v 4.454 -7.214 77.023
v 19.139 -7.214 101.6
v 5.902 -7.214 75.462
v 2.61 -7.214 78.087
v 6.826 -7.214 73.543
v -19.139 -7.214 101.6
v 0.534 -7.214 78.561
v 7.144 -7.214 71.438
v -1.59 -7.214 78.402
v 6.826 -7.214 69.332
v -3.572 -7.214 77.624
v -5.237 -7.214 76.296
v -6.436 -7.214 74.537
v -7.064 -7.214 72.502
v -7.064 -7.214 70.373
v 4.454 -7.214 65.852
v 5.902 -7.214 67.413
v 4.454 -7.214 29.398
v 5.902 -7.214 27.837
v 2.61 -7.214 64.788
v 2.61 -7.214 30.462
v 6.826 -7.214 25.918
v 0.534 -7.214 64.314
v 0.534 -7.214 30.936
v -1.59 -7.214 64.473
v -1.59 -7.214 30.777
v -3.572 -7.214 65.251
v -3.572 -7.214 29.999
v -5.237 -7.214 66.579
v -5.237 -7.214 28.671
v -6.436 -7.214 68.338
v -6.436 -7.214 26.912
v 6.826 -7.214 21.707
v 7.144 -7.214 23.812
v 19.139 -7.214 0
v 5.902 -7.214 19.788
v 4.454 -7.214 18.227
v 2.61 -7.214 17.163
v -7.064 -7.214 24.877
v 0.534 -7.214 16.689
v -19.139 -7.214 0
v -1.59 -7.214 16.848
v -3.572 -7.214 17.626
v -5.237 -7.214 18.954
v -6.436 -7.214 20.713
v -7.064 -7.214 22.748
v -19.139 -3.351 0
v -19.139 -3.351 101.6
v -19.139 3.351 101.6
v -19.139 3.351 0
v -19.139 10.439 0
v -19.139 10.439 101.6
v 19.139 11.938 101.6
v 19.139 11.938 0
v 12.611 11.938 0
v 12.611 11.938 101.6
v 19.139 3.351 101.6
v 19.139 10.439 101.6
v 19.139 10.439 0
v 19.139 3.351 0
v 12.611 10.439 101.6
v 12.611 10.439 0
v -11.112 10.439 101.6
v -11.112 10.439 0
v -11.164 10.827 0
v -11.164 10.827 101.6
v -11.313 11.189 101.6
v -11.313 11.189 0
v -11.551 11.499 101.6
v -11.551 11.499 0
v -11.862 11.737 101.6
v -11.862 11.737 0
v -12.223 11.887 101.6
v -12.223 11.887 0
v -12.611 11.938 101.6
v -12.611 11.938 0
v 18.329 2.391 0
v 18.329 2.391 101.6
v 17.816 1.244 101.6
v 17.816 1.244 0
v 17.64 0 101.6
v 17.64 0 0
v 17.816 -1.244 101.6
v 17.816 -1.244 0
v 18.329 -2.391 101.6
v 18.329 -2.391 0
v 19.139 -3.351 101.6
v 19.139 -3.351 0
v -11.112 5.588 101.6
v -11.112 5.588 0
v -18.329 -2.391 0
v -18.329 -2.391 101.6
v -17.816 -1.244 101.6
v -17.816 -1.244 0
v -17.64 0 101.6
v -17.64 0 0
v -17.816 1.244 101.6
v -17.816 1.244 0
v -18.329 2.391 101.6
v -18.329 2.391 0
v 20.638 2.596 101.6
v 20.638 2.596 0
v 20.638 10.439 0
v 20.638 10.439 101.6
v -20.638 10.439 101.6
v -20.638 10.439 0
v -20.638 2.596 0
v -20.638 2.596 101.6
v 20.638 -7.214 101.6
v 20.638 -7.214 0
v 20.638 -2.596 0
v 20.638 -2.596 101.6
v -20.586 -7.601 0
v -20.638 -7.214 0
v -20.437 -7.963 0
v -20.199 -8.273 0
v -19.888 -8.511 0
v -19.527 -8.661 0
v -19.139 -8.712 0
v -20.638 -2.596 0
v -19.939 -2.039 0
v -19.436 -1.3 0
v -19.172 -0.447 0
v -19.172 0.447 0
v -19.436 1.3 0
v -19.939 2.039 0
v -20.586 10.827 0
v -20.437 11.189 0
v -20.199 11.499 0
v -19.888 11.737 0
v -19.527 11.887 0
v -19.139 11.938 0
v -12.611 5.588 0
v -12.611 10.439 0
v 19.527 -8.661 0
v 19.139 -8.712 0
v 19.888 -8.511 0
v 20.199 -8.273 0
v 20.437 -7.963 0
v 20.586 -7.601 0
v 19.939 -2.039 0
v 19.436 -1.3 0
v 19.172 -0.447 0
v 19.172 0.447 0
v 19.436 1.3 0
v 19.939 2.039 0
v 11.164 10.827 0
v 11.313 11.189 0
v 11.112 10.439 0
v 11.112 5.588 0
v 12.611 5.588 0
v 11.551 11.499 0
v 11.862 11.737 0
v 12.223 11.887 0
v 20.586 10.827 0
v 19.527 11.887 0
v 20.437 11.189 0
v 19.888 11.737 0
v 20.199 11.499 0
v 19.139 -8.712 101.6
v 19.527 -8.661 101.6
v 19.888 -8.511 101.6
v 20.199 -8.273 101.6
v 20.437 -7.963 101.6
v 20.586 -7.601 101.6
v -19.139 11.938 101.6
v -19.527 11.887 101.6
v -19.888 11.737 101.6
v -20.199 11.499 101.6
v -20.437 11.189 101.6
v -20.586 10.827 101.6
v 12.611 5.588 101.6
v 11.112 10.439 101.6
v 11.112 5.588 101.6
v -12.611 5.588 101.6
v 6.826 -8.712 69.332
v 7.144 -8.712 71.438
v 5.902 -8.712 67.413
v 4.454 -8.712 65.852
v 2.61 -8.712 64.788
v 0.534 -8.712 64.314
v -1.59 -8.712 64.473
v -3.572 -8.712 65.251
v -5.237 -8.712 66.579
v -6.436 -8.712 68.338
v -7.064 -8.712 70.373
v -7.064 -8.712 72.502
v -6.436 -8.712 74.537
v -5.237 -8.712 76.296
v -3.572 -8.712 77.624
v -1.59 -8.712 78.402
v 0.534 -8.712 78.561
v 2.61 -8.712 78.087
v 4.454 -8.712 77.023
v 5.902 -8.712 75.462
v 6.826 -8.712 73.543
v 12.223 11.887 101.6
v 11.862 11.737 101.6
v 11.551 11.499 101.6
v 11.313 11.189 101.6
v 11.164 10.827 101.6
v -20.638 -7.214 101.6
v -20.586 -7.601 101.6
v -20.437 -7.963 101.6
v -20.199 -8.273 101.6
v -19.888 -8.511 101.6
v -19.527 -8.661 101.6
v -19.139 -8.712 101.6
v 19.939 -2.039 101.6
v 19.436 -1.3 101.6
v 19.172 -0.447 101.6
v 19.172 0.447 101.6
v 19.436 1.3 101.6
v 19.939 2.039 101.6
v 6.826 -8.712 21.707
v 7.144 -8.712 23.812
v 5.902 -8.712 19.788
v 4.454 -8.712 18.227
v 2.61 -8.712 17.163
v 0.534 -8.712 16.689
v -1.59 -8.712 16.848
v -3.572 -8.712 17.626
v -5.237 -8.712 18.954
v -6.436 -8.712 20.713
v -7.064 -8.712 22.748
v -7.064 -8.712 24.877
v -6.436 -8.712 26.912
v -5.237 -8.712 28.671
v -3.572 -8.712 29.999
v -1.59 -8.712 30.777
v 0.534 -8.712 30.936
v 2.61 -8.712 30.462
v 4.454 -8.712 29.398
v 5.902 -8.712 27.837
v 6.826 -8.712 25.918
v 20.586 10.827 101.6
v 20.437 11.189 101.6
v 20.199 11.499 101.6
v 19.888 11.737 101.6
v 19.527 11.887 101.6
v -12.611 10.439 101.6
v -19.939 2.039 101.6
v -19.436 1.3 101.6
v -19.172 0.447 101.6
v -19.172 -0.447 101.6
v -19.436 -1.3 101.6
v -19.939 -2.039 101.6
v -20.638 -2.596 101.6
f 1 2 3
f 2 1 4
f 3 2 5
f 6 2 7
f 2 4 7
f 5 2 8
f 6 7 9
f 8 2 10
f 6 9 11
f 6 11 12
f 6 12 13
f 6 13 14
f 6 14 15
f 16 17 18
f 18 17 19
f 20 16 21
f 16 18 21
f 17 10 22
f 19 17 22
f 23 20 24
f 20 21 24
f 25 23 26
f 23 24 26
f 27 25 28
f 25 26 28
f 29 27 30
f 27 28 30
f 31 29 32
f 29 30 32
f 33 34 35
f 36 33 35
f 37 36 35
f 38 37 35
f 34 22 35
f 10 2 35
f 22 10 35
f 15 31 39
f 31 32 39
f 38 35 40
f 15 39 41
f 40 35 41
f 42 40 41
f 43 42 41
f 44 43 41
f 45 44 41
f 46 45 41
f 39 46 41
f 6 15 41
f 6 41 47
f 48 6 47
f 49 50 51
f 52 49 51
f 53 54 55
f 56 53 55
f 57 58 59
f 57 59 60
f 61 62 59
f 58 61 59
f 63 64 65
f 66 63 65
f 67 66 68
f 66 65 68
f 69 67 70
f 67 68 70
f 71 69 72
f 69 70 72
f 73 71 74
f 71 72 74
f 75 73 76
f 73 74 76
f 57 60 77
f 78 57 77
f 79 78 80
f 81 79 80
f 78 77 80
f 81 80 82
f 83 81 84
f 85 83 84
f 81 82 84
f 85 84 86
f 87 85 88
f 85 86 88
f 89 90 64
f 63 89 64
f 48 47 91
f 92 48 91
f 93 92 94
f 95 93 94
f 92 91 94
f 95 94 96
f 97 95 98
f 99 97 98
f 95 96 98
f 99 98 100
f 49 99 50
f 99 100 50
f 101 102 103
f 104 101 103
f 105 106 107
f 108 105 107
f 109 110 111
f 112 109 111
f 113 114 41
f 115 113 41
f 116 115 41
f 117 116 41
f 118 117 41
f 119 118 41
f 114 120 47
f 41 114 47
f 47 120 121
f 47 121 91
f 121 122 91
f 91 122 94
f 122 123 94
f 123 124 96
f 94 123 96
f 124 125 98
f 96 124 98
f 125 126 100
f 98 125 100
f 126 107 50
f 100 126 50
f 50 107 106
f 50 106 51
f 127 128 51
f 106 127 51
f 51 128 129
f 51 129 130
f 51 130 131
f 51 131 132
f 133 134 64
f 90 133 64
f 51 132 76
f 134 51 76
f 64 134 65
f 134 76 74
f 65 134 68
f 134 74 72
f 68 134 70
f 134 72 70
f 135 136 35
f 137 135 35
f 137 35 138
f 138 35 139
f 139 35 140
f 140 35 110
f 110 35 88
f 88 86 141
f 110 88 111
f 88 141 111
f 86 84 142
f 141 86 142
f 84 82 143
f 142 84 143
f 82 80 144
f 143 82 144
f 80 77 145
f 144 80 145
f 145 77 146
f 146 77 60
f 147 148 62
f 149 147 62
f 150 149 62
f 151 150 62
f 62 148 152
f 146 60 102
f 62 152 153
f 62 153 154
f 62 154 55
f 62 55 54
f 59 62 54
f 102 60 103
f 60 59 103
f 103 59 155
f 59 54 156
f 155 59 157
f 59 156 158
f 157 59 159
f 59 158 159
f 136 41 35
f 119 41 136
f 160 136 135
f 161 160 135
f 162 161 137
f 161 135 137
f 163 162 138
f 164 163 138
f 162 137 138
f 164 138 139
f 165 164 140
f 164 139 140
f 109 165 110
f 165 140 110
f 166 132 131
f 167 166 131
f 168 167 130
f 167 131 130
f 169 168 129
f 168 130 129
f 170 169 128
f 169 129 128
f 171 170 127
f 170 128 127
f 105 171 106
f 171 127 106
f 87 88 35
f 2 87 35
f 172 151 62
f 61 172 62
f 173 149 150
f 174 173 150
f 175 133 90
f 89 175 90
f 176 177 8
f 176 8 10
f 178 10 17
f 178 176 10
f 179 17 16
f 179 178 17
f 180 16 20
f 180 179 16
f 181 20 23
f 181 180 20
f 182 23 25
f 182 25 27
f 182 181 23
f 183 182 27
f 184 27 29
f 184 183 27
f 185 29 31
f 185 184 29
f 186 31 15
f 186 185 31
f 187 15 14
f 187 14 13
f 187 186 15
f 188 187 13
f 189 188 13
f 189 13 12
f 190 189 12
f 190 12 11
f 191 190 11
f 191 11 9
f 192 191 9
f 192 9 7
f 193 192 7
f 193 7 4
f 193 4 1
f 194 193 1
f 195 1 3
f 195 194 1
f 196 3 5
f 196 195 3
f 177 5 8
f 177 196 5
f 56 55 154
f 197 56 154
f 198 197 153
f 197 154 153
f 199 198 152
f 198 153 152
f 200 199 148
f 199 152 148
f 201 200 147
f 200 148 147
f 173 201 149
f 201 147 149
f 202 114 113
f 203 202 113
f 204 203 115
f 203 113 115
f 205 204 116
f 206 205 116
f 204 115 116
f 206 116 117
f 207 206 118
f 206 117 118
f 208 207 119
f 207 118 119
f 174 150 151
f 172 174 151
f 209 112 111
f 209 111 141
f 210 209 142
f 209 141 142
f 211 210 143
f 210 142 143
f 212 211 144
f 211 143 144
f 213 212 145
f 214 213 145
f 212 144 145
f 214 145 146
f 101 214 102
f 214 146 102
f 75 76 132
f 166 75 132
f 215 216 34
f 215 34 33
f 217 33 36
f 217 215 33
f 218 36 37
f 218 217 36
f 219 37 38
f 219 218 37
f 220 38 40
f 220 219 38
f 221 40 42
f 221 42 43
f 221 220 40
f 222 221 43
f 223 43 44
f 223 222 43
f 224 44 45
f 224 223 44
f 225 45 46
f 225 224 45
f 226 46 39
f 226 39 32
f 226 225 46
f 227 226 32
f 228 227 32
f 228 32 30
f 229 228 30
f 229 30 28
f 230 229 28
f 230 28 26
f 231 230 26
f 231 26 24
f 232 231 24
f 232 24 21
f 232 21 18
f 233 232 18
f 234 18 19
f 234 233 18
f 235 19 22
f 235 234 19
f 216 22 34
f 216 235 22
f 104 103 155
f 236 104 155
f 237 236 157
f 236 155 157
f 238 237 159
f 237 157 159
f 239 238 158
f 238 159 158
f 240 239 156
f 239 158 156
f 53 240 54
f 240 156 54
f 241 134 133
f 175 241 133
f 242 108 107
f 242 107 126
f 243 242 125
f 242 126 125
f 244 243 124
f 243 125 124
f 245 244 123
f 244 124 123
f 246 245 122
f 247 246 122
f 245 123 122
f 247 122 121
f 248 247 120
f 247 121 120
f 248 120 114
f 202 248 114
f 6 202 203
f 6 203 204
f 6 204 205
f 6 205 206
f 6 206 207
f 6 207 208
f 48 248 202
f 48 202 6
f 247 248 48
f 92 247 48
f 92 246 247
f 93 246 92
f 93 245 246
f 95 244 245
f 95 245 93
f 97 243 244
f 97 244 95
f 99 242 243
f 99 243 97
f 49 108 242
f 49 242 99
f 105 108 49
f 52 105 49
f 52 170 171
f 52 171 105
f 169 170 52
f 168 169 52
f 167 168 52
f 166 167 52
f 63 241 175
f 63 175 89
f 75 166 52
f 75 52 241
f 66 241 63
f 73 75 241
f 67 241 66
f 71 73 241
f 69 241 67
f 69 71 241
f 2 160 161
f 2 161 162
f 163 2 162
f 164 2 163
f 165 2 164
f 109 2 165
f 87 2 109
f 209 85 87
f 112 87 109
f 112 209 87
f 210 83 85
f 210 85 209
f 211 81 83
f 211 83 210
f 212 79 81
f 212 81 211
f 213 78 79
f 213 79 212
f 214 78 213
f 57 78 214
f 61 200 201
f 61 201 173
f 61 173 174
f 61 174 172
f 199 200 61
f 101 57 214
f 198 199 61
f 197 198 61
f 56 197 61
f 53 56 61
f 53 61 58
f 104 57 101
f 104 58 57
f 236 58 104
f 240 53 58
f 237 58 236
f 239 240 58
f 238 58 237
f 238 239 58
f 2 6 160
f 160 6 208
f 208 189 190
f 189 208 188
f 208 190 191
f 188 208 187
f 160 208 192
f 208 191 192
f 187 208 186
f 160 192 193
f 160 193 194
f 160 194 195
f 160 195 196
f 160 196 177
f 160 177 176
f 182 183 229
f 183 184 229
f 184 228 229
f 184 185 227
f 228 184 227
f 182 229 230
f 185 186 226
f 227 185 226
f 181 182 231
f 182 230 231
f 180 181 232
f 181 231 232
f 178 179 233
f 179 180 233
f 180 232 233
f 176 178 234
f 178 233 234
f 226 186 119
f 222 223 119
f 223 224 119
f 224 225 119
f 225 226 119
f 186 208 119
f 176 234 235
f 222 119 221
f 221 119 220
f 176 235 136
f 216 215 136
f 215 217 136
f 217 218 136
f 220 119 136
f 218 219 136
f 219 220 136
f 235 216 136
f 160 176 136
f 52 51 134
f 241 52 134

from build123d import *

# Parameters (mm, degrees)
BASE_EXTRUDE_DEPTH = 101.6
HOLE1_START        = -8.7122
HOLE1_OUTLINE_R    = 7.14375
HOLE1_DEPTH        = 1.4986
LPATTERN2_COUNT    = 2
LPATTERN2_PITCH    = 47.625


# Read off the part's stored shape, not the designer's step: Hole1
with BuildPart() as part:
    # Sketch1 → Base-Extrude (new body)
    with BuildSketch(Plane.XY):
        with BuildLine():
            Line((-20.6375, 10.4394), (-20.6375, 2.59565134))
            ThreePointArc((-20.6375, 2.59565134), (-19.1389, 0), (-20.6375, -2.59565134))
            Line((-20.6375, -2.59565134), (-20.6375, -7.2136))
            ThreePointArc((-20.6375, -7.2136), (-20.198570222, -8.273270222), (-19.1389, -8.7122))
            Line((-19.1389, -8.7122), (19.1389, -8.7122))
            ThreePointArc((19.1389, -8.7122), (20.198570222, -8.273270222), (20.6375, -7.2136))
            Line((20.6375, -7.2136), (20.6375, -2.59565134))
            ThreePointArc((20.6375, -2.59565134), (19.1389, 0), (20.6375, 2.59565134))
            Line((20.6375, 2.59565134), (20.6375, 10.4394))
            ThreePointArc((20.6375, 10.4394), (20.198570222, 11.499070222), (19.1389, 11.938))
            Line((19.1389, 11.938), (12.6111, 11.938))
            ThreePointArc((12.6111, 11.938), (11.551429778, 11.499070222), (11.1125, 10.4394))
            Line((11.1125, 10.4394), (11.1125, 5.588))
            Line((11.1125, 5.588), (12.6111, 5.588))
            Line((12.6111, 5.588), (12.6111, 10.4394))
            Line((12.6111, 10.4394), (19.1389, 10.4394))
            Line((19.1389, 10.4394), (19.1389, 3.350971471))
            ThreePointArc((19.1389, 3.350971471), (17.6403, 0), (19.1389, -3.350971471))
            Line((19.1389, -3.350971471), (19.1389, -7.2136))
            Line((19.1389, -7.2136), (-19.1389, -7.2136))
            Line((-19.1389, -7.2136), (-19.1389, -3.350971471))
            ThreePointArc((-19.1389, -3.350971471), (-17.6403, 0), (-19.1389, 3.350971471))
            Line((-19.1389, 3.350971471), (-19.1389, 10.4394))
            Line((-19.1389, 10.4394), (-12.6111, 10.4394))
            Line((-12.6111, 10.4394), (-12.6111, 5.588))
            Line((-12.6111, 5.588), (-11.1125, 5.588))
            Line((-11.1125, 5.588), (-11.1125, 10.4394))
            ThreePointArc((-11.1125, 10.4394), (-11.551429778, 11.499070222), (-12.6111, 11.938))
            Line((-12.6111, 11.938), (-19.1389, 11.938))
            ThreePointArc((-19.1389, 11.938), (-20.198570222, 11.499070222), (-20.6375, 10.4394))
        make_face()
    extrude(amount=BASE_EXTRUDE_DEPTH)

    # Hole1 outline → Hole1 (cut)
    with BuildSketch(Plane(origin=(0, 0, 0), x_dir=(1, 0, 0), z_dir=(0, 1, 0)).offset(HOLE1_START)):
        with Locations((0, -23.8125)):
            Circle(HOLE1_OUTLINE_R)
    hole1 = extrude(amount=HOLE1_DEPTH, mode=Mode.SUBTRACT)

    # LPattern2: Hole1 ×2
    with Locations(*[(0, 0, i * LPATTERN2_PITCH) for i in range(1, LPATTERN2_COUNT)]):
        add(hole1, mode=Mode.SUBTRACT)


solid = part.part
